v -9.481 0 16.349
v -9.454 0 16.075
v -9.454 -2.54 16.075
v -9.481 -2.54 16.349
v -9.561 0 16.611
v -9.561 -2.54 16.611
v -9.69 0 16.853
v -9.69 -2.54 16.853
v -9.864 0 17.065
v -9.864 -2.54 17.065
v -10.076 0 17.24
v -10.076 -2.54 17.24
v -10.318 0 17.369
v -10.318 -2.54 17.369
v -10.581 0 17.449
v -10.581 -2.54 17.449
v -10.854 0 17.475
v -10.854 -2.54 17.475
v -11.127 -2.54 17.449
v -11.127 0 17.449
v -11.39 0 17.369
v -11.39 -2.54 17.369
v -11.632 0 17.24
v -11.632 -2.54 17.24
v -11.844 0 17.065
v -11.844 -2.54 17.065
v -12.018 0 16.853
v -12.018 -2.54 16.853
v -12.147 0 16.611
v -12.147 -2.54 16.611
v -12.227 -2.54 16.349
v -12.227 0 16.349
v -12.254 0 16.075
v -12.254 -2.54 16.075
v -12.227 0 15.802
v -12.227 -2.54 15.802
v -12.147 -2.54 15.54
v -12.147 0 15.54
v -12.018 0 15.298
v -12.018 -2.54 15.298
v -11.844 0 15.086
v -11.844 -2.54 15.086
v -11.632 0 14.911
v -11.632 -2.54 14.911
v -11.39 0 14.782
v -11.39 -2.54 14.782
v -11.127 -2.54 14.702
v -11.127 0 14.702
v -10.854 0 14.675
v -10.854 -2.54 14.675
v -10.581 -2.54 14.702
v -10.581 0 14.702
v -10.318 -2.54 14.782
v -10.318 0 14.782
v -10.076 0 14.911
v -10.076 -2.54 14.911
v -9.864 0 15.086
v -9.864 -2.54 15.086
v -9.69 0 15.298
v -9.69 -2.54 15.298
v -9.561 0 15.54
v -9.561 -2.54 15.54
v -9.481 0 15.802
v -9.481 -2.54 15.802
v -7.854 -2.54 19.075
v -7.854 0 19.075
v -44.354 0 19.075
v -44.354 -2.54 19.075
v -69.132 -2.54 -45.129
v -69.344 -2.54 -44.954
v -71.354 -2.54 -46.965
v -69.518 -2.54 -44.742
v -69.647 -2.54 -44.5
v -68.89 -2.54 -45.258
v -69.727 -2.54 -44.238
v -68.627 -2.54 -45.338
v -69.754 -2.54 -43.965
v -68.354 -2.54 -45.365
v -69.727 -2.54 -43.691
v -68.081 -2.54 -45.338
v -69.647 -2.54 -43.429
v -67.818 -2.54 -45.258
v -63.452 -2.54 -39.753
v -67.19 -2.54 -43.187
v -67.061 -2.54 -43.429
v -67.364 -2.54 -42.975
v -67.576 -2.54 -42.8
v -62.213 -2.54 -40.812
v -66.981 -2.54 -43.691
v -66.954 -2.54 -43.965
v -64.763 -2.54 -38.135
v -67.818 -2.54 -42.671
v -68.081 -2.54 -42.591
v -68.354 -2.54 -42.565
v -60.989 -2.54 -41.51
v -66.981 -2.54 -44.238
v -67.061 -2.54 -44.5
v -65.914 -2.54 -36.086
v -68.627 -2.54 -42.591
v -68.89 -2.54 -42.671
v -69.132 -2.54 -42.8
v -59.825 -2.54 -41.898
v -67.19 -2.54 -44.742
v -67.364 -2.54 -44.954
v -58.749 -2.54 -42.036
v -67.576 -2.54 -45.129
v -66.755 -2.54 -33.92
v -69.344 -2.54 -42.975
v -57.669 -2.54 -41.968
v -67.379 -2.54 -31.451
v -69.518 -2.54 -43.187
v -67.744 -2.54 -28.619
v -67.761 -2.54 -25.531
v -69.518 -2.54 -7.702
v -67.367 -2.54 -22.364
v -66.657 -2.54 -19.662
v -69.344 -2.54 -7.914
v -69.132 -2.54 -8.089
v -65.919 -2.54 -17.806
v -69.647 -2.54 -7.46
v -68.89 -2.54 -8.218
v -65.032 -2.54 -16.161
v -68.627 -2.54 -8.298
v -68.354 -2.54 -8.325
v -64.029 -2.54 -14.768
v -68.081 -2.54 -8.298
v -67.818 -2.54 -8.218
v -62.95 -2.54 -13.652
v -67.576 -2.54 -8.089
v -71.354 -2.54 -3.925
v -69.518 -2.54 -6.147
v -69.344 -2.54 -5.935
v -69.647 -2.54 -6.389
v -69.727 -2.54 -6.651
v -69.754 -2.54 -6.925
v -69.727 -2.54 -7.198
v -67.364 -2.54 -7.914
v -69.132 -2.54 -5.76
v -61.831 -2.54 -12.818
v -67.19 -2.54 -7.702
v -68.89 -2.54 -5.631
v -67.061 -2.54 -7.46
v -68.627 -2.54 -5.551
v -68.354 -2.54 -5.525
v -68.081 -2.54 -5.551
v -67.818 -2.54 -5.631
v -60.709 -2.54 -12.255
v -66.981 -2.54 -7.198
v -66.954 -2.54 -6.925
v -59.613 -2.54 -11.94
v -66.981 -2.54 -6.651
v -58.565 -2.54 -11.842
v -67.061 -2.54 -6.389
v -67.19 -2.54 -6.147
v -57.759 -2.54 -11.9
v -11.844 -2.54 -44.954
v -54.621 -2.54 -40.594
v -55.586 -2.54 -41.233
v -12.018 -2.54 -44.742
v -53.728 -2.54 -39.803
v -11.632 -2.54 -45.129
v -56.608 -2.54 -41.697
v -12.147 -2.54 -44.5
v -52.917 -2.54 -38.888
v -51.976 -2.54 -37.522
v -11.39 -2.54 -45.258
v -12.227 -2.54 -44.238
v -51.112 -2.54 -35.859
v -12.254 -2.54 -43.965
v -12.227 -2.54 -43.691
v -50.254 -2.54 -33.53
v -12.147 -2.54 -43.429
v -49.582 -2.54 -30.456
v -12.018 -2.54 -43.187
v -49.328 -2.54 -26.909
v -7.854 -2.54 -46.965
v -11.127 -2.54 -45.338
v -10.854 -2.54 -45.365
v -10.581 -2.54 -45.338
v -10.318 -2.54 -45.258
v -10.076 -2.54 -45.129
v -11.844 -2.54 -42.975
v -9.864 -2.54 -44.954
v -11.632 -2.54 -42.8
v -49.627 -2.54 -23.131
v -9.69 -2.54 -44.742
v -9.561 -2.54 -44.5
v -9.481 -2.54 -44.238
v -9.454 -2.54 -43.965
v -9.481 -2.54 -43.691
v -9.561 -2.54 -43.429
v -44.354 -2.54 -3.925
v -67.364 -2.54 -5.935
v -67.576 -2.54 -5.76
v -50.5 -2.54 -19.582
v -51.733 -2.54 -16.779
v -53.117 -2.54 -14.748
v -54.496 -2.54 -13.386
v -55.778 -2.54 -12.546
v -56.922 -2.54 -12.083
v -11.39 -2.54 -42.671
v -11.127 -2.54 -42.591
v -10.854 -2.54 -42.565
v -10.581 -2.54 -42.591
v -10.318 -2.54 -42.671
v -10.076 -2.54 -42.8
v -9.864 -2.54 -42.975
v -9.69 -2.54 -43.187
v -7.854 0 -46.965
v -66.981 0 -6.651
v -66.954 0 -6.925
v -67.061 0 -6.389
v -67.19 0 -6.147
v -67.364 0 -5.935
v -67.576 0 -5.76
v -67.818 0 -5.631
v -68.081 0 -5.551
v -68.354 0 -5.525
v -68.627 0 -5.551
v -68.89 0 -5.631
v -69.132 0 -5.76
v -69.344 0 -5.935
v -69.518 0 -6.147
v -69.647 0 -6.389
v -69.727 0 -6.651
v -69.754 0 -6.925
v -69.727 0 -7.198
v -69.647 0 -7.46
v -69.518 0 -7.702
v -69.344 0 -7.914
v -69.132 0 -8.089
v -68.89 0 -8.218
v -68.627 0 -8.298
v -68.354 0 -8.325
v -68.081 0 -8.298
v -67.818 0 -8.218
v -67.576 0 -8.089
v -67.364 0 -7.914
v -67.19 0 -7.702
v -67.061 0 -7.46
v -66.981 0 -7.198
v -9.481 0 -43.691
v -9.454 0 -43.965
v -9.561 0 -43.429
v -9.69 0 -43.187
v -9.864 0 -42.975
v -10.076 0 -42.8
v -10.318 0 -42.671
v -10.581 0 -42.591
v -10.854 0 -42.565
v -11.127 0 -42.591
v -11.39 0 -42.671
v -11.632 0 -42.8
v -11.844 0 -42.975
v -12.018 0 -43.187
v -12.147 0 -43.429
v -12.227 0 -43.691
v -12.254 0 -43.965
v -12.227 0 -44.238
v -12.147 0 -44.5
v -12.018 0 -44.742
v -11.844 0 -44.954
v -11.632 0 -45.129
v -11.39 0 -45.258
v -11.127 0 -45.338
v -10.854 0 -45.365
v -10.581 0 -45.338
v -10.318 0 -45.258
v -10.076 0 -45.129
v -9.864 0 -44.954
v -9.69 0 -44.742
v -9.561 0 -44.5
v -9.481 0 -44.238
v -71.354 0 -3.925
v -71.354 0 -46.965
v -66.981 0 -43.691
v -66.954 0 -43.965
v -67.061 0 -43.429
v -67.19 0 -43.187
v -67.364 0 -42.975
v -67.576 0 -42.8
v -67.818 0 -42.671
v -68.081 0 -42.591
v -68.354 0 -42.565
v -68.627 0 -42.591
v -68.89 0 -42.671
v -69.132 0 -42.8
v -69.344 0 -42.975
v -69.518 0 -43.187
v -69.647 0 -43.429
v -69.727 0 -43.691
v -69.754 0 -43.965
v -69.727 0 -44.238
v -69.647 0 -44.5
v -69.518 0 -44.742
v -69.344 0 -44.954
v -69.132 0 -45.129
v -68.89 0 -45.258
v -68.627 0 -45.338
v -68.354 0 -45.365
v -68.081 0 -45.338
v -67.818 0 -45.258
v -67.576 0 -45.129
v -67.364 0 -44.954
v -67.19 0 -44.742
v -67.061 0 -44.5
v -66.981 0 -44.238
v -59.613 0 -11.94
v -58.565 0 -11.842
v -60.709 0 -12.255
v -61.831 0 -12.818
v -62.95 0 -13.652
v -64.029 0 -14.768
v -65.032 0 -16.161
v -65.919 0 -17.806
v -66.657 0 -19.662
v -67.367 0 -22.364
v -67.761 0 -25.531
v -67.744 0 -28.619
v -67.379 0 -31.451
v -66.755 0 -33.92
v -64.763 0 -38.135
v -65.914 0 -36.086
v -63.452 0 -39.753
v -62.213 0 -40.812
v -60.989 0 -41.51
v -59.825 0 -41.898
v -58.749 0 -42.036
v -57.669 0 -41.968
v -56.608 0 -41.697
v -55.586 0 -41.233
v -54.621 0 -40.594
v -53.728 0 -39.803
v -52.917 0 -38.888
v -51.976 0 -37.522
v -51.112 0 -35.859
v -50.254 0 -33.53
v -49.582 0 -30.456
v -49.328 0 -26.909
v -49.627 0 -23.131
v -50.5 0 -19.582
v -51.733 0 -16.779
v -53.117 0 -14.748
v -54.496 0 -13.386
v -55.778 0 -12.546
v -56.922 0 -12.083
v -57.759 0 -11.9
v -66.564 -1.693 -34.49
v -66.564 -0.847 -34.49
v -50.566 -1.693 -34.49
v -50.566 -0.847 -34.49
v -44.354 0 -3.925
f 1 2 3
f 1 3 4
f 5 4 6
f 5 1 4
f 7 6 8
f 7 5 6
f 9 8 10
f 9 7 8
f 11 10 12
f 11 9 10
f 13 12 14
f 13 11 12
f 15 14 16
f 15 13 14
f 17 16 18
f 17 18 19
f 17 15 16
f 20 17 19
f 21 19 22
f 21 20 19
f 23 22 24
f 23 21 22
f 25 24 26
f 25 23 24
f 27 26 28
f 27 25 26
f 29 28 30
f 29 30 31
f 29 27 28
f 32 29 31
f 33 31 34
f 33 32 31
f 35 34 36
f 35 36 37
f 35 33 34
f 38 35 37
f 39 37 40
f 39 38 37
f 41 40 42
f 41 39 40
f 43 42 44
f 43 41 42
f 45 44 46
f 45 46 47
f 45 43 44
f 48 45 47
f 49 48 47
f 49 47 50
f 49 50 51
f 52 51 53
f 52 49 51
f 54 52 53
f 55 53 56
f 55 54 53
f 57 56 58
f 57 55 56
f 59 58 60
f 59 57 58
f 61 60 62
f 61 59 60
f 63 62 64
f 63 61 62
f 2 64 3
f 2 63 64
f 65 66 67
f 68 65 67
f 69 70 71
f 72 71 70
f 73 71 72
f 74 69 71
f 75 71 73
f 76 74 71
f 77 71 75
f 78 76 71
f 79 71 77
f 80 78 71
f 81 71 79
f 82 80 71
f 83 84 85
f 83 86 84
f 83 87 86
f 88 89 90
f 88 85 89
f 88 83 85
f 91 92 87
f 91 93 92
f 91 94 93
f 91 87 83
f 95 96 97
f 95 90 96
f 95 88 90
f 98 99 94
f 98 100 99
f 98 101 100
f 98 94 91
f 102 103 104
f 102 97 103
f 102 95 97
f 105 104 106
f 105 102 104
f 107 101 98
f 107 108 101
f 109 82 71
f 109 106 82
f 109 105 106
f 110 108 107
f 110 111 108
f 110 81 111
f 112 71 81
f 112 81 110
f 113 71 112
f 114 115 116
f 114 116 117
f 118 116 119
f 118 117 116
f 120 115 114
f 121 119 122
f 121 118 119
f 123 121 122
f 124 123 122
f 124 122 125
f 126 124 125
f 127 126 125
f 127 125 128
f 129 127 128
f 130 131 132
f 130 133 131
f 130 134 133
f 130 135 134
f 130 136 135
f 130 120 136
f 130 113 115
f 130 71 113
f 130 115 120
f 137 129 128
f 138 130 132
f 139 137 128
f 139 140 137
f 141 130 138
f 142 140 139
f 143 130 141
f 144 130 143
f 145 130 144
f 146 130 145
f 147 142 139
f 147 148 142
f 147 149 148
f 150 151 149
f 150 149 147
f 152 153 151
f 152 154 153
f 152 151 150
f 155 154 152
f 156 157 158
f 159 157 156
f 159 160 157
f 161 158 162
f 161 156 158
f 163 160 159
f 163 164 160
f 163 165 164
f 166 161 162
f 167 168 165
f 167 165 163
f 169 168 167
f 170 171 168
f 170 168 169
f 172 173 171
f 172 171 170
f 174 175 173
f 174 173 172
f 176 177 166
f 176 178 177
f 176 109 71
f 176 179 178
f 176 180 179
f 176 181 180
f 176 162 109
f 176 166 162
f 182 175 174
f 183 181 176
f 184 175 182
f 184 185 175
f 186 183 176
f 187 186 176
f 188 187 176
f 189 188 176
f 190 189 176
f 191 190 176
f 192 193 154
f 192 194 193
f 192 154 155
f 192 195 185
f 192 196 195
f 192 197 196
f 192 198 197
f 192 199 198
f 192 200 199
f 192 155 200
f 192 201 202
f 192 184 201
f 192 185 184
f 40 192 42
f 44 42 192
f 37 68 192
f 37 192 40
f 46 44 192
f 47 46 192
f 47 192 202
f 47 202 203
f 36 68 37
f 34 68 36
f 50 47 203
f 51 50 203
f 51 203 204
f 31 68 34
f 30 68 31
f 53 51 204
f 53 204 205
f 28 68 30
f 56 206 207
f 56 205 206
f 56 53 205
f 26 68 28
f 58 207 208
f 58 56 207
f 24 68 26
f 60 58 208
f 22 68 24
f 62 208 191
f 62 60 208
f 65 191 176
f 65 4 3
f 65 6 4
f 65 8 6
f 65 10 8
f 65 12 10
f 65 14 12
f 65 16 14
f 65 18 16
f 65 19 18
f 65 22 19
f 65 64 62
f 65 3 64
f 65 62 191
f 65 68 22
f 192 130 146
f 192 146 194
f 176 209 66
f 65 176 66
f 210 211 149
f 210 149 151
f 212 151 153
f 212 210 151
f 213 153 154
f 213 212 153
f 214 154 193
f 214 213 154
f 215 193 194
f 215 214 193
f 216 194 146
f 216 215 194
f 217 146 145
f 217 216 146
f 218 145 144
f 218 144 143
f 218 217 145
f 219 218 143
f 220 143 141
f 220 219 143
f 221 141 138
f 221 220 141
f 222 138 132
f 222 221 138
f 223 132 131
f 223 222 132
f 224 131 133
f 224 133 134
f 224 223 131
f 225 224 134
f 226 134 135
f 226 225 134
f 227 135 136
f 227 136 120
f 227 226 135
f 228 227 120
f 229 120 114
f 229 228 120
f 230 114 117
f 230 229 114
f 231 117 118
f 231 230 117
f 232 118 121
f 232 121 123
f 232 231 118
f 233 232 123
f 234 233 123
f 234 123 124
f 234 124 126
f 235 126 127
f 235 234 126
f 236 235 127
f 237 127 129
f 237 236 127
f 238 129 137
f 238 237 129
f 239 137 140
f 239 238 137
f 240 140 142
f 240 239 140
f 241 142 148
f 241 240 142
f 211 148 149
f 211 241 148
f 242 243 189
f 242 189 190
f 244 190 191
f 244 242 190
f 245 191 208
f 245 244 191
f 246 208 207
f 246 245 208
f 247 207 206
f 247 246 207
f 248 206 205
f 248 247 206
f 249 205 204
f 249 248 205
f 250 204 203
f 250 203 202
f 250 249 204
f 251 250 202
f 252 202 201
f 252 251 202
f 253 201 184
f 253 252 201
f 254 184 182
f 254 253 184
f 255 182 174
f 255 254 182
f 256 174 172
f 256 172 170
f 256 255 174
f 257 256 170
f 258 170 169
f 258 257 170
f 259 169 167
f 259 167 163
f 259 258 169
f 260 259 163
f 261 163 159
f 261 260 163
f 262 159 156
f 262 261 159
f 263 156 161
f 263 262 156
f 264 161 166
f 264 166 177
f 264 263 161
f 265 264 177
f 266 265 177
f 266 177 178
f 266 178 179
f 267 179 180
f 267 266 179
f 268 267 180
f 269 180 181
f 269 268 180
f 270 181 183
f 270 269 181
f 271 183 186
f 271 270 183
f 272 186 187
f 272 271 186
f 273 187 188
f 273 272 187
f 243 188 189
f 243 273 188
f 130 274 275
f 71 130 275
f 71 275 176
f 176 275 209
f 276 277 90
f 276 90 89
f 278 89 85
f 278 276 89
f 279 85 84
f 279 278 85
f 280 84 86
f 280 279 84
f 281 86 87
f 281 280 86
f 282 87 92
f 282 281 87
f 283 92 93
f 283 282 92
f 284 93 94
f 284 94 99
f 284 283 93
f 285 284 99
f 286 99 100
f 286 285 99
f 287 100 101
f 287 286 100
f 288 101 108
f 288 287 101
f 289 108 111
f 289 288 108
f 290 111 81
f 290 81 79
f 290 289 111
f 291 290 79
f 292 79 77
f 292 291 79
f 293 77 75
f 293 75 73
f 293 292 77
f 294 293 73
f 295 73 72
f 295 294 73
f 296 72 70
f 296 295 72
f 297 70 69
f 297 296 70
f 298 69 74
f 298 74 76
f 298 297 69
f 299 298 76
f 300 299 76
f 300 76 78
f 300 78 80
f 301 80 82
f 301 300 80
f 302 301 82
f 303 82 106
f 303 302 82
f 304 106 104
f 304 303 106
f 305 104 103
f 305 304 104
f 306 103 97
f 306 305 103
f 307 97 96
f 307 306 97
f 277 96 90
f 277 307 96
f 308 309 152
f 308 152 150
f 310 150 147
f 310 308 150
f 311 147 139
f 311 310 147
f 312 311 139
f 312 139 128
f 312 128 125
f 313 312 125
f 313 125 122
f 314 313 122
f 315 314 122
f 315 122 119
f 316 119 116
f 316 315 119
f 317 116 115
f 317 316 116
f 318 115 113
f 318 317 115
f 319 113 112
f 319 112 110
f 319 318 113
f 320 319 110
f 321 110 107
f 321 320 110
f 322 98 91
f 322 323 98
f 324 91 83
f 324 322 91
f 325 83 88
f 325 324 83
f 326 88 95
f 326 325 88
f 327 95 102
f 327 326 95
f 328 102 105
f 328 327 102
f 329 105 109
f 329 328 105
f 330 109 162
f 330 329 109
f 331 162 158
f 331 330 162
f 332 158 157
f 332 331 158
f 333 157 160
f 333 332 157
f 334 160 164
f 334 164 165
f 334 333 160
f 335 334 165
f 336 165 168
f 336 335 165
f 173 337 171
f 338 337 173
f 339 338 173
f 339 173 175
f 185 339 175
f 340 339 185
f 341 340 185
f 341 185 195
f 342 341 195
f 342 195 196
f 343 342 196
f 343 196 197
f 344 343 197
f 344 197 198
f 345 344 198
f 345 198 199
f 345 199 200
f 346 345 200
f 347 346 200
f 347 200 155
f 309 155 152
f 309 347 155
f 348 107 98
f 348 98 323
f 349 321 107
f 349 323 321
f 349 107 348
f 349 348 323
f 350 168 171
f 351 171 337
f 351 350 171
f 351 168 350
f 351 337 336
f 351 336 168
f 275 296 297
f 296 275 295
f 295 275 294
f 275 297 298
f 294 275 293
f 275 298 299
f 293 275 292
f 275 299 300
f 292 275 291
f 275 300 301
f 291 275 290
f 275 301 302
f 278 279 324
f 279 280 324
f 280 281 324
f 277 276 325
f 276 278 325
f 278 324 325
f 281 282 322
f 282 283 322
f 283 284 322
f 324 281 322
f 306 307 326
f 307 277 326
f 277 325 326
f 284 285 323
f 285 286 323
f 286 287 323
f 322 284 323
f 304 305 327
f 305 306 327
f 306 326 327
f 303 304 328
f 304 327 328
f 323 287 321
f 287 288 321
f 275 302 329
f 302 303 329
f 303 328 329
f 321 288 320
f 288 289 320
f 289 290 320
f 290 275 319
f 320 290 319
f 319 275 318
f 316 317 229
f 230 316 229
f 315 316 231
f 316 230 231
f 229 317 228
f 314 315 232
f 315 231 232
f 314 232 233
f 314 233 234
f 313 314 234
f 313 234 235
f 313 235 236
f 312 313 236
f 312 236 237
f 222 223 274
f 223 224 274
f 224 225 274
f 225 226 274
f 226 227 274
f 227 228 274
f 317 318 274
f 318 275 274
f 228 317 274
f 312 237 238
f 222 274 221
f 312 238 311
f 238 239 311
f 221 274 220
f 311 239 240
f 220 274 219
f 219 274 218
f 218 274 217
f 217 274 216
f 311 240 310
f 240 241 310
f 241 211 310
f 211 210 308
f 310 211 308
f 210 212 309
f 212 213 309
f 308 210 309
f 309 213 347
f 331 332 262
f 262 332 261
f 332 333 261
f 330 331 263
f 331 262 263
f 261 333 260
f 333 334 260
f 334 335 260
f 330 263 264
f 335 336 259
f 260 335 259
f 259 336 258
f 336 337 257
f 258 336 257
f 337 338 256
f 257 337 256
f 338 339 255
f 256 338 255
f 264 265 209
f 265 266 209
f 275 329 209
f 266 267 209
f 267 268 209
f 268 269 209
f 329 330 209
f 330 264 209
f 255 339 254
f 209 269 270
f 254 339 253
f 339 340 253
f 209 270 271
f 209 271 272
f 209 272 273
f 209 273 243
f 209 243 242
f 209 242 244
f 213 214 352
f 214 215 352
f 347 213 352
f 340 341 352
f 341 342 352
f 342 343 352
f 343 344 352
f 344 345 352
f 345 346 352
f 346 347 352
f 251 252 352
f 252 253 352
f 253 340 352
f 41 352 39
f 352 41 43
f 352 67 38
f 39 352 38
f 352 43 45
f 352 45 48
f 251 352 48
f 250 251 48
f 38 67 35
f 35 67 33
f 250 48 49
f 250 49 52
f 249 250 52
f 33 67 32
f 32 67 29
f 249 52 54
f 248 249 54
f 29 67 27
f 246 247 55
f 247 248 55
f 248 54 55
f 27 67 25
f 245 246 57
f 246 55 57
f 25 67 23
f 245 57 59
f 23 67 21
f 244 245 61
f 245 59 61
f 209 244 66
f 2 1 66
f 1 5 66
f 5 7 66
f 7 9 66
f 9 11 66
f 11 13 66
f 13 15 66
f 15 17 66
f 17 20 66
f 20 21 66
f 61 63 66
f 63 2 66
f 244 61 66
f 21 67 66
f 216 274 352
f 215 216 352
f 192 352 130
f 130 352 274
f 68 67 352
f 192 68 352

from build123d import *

# Parameters (mm, degrees)
F0_R     = 1.4
F1_DEPTH = 2.54


with BuildPart() as f1:
    # F0 (on Front) → F1 (new body)
    with BuildSketch(Plane.XZ):
        Polygon((-7.853946, 19.075462), (-44.353946, 19.075462), (-44.353946, -3.924538), (-71.353946, -3.924538), (-71.353946, -46.964538), (-7.853946, -46.964538), align=None)
        with Locations((-68.353946, -43.964538)):
            Circle(F0_R, mode=Mode.SUBTRACT)
        with BuildLine():
            add(Edge.make_bspline(
                [(-58.564875, -11.842106), (-74.562795, -11.842106), (-66.563835, -34.490134), (-58.564875, -57.138162), (-50.565916, -34.490134), (-42.566956, -11.842106), (-58.564875, -11.842106)],
                knots=[0, 0, 0, 2.094395, 2.094395, 4.18879, 4.18879, 6.283185, 6.283185, 6.283185], degree=2, weights=[1, 0.5, 1, 0.5, 1, 0.5, 1]))
        make_face(mode=Mode.SUBTRACT)
        with Locations((-10.853946, -43.964538)):
            Circle(F0_R, mode=Mode.SUBTRACT)
        with Locations((-68.353946, -6.924538)):
            Circle(F0_R, mode=Mode.SUBTRACT)
        with Locations((-10.853946, 16.075462)):
            Circle(F0_R, mode=Mode.SUBTRACT)
    extrude(amount=F1_DEPTH)


solid = f1.part
